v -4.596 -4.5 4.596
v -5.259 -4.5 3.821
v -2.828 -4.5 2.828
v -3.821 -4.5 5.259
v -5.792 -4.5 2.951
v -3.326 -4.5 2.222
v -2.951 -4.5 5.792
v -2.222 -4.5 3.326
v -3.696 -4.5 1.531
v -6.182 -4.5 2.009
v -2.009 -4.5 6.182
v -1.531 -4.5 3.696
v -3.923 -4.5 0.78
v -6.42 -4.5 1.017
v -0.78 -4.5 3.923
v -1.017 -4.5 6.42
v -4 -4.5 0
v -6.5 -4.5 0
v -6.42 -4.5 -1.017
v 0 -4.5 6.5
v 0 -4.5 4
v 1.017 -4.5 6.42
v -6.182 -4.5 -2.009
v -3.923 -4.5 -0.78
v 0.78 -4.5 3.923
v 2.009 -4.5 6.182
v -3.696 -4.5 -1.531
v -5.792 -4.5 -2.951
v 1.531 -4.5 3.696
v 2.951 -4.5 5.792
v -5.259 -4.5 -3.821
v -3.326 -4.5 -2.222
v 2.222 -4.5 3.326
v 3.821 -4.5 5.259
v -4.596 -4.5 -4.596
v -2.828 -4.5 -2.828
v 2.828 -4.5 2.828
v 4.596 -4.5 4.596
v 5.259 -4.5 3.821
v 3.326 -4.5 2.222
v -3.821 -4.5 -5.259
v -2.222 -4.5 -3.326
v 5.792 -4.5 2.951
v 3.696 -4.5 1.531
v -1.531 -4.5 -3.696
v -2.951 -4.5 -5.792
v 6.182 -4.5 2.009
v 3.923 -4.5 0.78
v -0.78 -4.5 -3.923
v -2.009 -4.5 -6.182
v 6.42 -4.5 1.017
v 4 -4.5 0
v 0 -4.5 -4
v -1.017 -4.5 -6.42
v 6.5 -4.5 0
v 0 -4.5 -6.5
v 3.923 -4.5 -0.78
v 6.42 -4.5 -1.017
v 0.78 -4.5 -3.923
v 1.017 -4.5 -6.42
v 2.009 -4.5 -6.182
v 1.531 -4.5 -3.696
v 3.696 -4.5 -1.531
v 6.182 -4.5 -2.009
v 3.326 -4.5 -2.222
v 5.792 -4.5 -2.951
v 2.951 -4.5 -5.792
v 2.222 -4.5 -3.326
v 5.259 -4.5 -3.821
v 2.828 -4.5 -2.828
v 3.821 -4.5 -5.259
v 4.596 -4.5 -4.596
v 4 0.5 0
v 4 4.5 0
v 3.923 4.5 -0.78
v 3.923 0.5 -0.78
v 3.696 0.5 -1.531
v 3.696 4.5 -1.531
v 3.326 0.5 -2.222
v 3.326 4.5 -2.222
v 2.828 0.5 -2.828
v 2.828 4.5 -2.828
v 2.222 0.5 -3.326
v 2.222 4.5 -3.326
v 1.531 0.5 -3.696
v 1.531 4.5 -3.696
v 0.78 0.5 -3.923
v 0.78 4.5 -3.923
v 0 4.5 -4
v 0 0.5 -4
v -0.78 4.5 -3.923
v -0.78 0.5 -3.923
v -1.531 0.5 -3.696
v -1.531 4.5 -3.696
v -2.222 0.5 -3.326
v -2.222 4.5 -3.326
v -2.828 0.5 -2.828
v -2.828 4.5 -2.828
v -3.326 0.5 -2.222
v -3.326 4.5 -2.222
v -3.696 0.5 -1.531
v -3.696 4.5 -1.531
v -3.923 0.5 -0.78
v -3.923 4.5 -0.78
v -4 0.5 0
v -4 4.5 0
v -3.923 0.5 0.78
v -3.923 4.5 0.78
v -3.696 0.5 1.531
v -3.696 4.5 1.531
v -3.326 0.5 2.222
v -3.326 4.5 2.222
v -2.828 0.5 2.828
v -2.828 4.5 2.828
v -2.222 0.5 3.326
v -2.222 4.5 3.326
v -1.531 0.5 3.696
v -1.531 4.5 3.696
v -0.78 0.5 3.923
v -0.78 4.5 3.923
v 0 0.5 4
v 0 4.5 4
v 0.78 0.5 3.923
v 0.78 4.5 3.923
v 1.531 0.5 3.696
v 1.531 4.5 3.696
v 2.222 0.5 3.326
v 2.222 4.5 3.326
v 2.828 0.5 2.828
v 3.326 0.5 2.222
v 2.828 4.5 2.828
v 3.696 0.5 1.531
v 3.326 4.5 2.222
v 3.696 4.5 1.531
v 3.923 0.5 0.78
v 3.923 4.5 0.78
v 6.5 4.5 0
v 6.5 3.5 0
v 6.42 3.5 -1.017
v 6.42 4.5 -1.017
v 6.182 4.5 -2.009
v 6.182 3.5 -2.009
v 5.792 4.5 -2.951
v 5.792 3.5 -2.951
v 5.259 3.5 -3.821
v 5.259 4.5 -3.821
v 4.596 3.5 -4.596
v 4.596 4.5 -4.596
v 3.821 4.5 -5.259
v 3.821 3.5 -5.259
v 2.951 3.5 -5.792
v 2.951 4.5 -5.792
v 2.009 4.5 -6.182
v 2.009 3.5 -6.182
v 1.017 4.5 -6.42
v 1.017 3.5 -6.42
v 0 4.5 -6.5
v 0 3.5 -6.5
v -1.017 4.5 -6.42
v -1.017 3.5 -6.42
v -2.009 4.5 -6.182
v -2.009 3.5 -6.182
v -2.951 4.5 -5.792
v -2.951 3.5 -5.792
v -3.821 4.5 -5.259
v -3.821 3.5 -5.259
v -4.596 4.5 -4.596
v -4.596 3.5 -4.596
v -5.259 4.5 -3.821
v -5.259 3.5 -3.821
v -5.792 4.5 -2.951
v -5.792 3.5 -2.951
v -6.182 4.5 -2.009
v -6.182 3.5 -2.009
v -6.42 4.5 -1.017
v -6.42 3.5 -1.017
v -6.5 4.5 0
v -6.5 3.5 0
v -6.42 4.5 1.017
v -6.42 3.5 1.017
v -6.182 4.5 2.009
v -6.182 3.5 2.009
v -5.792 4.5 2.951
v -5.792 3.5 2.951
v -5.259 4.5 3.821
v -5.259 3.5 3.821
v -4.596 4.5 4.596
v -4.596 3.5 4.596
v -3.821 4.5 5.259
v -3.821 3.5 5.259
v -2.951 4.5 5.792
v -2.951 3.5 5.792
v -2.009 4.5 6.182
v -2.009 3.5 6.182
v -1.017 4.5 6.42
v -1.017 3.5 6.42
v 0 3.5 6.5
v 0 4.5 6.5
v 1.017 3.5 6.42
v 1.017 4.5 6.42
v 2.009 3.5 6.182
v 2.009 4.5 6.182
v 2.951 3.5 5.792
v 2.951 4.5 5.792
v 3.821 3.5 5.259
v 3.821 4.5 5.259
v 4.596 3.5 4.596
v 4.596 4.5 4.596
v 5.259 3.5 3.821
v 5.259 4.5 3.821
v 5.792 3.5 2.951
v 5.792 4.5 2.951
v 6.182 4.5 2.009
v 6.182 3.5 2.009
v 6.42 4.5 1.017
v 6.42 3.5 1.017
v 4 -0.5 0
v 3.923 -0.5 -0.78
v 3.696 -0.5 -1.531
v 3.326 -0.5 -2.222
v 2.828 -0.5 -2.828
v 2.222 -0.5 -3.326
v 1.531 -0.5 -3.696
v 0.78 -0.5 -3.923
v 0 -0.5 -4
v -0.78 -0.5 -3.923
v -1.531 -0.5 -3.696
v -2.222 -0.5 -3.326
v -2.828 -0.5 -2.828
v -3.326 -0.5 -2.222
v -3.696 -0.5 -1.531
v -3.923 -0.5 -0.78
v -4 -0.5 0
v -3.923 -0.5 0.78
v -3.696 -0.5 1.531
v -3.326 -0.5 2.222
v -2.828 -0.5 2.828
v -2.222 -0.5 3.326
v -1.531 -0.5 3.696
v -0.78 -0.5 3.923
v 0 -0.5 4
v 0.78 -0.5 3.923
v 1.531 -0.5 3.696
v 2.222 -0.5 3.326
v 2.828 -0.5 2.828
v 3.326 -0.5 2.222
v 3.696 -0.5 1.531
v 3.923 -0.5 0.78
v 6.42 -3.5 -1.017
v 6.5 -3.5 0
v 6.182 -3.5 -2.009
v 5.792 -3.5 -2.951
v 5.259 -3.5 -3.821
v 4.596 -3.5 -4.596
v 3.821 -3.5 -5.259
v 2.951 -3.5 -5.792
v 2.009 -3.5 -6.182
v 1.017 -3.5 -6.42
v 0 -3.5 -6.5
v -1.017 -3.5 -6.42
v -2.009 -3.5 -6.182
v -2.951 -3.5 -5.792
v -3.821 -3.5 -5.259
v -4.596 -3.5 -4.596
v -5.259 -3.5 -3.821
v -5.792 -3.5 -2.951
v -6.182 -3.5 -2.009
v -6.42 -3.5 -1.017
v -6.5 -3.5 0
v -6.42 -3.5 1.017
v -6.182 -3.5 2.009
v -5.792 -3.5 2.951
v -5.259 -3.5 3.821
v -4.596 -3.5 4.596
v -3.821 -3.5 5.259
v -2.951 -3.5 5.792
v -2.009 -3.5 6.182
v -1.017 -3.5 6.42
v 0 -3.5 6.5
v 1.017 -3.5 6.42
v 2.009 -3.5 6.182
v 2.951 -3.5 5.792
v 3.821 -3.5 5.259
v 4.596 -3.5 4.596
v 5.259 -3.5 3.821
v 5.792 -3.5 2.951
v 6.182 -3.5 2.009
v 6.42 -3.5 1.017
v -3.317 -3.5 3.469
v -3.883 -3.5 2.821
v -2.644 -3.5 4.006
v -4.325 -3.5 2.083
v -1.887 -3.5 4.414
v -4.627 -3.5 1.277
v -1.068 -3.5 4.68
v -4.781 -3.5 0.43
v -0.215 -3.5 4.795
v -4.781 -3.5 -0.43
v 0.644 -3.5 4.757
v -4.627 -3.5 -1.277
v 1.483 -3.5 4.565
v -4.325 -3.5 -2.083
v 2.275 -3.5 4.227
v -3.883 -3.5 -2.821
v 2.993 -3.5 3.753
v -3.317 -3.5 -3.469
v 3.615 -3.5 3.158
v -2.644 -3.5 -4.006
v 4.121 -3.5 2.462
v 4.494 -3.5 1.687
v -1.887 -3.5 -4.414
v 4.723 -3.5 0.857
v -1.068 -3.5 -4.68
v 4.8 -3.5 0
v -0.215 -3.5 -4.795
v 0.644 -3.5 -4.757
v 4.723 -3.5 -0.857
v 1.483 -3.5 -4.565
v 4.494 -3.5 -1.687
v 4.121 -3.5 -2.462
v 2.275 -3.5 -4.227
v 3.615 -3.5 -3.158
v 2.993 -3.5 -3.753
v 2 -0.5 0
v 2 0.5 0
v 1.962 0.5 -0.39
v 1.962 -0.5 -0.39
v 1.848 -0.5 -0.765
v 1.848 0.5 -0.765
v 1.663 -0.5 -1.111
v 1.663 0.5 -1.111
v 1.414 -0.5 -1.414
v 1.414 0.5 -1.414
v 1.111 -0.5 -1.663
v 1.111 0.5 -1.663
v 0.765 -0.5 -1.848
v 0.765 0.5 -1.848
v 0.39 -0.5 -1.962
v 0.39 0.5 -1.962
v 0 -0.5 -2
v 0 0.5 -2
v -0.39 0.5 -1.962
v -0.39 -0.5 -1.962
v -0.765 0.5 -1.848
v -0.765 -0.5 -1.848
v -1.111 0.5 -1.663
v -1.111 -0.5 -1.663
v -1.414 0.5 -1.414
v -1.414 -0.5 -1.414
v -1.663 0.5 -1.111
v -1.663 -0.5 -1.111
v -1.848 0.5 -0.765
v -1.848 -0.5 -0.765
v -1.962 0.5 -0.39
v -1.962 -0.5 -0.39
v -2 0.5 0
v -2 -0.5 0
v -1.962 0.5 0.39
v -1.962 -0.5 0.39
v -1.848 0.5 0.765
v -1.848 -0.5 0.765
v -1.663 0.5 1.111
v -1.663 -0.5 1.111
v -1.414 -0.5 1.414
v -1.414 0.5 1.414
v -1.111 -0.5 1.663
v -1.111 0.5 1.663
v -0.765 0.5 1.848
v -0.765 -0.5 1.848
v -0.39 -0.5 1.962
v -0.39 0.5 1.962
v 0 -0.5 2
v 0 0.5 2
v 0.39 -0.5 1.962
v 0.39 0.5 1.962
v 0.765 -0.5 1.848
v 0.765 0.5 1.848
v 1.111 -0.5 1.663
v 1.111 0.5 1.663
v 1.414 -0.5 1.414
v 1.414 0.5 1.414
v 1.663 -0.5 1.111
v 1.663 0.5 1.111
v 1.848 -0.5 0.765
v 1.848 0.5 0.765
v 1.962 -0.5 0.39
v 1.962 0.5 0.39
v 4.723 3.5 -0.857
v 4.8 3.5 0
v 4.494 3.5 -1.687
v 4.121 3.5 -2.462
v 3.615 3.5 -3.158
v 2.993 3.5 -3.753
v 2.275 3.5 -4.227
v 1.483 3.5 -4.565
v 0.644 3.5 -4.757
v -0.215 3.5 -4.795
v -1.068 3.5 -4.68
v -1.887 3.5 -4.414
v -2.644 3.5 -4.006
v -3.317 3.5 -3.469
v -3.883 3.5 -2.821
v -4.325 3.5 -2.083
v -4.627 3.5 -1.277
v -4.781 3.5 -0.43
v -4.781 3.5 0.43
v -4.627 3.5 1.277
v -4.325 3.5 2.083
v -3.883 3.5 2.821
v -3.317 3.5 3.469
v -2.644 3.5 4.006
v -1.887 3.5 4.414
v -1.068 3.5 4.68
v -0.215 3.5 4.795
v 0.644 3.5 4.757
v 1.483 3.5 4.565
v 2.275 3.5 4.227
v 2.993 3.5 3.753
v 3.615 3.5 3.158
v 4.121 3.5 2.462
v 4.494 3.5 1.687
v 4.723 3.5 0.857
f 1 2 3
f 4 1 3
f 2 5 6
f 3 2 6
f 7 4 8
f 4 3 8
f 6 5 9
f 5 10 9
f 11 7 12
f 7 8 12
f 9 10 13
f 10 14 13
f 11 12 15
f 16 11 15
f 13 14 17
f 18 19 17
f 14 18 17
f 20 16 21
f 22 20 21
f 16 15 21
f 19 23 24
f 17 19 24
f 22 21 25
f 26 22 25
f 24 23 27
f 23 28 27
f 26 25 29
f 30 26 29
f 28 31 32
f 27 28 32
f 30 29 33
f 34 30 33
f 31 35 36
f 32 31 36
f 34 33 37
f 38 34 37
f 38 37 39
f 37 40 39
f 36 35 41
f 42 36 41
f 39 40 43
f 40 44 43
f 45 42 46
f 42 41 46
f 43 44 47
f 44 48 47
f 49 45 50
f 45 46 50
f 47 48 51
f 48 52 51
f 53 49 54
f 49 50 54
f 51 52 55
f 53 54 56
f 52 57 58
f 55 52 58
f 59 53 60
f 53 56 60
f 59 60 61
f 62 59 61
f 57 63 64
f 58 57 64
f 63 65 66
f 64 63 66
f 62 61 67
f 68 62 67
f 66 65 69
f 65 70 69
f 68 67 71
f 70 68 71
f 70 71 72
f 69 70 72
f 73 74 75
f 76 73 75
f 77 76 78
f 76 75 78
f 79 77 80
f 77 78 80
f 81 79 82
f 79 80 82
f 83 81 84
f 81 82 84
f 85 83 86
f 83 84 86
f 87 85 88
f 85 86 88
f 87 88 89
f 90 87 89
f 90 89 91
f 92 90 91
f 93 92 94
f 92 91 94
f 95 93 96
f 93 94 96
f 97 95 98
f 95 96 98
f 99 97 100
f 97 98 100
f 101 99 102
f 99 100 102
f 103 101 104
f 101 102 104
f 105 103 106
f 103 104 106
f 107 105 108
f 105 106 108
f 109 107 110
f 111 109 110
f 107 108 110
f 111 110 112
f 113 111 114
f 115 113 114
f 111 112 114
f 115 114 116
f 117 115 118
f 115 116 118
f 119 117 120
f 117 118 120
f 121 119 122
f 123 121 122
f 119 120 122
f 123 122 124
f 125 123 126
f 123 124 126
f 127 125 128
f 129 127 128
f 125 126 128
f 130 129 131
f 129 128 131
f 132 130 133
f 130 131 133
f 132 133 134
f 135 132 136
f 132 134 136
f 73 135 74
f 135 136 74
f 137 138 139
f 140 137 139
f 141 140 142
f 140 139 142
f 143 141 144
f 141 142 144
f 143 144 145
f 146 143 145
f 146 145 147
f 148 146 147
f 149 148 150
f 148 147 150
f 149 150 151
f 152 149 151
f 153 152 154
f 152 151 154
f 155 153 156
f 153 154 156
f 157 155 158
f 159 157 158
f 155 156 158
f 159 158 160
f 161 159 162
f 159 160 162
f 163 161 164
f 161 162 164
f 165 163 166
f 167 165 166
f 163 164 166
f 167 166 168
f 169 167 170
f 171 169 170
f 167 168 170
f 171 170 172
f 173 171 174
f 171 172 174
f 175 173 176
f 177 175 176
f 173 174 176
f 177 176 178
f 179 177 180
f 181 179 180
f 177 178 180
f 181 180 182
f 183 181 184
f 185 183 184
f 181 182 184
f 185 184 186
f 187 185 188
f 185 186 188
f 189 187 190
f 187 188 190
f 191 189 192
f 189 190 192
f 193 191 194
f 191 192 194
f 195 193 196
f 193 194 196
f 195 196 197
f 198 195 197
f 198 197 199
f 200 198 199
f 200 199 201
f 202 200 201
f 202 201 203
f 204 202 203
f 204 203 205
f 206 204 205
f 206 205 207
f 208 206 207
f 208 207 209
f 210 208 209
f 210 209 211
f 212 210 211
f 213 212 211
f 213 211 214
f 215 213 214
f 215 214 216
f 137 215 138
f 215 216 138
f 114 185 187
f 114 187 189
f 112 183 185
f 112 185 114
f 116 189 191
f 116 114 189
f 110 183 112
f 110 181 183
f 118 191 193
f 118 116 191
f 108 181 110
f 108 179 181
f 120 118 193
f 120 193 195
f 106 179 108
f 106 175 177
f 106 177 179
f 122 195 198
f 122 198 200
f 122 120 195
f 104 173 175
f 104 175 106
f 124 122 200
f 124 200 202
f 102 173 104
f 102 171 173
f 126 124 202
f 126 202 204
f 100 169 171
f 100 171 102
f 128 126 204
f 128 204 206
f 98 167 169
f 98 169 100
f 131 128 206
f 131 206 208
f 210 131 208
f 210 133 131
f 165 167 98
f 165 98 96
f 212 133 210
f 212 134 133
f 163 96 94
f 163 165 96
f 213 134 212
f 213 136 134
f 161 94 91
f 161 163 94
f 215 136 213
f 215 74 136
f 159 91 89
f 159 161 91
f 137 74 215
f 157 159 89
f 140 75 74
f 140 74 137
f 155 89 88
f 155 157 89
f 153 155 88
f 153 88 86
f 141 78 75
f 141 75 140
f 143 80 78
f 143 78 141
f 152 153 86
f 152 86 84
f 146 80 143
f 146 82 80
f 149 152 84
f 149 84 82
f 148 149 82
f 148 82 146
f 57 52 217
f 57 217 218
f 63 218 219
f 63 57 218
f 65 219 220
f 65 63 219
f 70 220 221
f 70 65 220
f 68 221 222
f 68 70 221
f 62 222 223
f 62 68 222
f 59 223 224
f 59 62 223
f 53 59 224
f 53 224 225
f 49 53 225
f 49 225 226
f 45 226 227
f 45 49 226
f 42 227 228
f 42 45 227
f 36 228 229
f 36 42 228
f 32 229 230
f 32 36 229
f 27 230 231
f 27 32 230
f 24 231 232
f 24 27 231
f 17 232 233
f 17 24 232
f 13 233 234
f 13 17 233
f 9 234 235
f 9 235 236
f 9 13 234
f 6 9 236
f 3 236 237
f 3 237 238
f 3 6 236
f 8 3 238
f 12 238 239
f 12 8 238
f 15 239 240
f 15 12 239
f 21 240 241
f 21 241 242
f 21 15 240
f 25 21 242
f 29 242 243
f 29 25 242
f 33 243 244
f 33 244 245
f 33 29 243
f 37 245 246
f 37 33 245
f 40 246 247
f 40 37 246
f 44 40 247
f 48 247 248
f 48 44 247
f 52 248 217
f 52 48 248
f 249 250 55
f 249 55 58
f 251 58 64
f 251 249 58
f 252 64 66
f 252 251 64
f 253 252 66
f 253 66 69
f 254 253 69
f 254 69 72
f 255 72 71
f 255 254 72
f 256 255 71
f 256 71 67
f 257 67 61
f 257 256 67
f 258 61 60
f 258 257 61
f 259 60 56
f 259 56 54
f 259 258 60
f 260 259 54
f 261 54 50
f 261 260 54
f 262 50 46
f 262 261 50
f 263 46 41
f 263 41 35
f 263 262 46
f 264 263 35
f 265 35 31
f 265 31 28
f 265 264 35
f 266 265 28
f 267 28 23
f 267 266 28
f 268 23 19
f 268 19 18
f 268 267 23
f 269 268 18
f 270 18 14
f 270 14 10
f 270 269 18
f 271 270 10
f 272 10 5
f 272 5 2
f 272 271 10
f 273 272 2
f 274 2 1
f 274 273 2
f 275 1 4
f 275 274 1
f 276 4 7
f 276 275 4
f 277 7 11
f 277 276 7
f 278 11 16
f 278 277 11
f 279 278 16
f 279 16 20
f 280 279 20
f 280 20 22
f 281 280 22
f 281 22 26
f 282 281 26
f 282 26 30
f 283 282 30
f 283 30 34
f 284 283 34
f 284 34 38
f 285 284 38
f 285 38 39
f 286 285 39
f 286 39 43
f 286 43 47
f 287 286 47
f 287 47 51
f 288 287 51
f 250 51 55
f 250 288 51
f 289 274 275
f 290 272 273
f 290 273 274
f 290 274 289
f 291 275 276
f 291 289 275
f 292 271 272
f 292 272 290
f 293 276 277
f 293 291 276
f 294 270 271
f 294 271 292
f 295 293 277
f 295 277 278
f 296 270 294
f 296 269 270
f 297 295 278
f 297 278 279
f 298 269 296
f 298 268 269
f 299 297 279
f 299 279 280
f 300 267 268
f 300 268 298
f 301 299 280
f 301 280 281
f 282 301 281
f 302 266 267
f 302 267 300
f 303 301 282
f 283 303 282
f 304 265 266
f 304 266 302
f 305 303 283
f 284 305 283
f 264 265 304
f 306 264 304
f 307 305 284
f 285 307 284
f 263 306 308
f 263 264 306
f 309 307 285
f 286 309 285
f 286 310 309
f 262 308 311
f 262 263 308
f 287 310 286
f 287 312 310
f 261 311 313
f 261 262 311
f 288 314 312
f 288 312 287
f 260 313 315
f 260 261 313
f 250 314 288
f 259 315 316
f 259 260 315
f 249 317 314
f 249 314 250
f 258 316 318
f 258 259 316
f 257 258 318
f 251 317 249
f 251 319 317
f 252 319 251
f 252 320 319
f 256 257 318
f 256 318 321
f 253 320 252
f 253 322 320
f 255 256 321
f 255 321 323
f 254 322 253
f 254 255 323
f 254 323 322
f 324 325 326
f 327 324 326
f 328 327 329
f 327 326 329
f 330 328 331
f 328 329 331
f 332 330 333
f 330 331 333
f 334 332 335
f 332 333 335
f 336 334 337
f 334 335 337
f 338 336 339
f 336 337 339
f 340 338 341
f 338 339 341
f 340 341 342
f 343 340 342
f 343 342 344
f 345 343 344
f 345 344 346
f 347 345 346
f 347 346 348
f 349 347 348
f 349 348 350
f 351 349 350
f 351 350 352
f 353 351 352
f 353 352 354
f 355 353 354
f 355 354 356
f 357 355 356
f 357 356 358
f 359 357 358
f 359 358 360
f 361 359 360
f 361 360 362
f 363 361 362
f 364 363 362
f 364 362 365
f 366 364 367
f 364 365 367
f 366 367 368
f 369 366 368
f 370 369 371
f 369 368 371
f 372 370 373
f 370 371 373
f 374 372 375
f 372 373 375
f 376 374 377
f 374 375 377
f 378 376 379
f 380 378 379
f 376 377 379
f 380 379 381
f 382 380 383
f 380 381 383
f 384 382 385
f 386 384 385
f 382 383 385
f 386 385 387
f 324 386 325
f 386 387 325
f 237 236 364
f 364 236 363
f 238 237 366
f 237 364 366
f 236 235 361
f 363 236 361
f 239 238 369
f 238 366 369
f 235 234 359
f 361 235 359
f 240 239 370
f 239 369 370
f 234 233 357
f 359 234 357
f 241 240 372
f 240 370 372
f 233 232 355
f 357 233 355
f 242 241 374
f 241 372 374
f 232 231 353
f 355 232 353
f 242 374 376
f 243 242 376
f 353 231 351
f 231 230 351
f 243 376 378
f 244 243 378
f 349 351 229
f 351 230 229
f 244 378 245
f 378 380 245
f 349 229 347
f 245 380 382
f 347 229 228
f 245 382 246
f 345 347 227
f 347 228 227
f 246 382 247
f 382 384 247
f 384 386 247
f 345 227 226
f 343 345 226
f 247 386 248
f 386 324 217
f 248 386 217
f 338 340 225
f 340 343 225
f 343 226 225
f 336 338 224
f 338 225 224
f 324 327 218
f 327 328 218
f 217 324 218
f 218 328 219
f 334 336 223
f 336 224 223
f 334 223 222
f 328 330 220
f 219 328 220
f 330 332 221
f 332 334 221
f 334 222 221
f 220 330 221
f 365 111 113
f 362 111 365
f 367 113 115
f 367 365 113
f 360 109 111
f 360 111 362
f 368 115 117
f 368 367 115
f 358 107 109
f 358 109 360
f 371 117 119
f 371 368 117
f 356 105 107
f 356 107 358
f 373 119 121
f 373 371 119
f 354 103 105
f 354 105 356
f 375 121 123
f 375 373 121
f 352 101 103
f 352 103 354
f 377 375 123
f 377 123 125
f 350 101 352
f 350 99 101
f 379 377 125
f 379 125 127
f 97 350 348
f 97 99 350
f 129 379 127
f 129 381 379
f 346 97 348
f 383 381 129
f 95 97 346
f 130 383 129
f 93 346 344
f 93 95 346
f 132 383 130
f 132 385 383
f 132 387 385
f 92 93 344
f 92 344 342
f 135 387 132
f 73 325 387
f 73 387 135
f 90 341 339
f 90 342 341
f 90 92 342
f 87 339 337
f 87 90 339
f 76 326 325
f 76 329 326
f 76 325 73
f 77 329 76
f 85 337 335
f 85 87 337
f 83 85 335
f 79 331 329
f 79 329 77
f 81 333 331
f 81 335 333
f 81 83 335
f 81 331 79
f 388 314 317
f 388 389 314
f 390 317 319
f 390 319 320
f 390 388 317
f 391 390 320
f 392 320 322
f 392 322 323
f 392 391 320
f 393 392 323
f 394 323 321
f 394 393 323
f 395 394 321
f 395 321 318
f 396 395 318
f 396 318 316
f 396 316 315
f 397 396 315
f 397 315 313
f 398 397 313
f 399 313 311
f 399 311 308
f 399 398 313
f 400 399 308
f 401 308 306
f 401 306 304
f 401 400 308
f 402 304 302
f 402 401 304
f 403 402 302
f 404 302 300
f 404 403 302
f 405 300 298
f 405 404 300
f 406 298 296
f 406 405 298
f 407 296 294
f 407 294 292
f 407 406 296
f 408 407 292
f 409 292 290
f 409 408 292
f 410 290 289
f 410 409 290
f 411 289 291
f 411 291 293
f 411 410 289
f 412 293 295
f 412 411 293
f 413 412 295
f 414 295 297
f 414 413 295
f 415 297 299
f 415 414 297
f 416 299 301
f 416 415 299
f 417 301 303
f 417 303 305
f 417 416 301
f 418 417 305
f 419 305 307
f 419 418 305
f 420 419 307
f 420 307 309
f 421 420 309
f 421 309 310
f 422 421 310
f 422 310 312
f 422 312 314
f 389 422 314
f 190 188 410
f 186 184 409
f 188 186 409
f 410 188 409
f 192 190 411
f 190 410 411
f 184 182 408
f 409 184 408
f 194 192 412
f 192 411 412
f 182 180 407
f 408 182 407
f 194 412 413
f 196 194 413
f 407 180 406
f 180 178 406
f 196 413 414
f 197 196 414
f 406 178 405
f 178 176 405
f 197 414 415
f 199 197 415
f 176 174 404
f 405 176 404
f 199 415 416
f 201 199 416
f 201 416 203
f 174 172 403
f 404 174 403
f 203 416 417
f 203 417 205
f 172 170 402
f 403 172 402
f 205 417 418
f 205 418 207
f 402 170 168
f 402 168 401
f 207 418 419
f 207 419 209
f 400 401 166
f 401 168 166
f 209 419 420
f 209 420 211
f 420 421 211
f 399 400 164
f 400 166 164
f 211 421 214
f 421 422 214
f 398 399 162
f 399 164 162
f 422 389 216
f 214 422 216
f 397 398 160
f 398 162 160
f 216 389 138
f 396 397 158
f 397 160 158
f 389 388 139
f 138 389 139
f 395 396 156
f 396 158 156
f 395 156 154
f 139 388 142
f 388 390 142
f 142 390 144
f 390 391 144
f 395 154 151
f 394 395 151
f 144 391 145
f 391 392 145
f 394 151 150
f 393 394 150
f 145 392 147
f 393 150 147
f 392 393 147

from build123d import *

# Parameters (mm, degrees)
SKETCH2_R           = 4.8
BOSS_EXTRUDE1_DEPTH = 3.5
SKETCH3_R           = 6.5
BOSS_EXTRUDE2_DEPTH = 1
SKETCH4_R           = 4
CUT_EXTRUDE1_DEPTH  = 4
SKETCH5_R           = 2
CUT_EXTRUDE2_DEPTH  = 6


with BuildPart() as part:
    # Sketch2 → Boss-Extrude1 (new body, symmetric)
    with BuildSketch(Plane(origin=(0, 0, 0), x_dir=(1, 0, 0), z_dir=(0, 1, 0))):
        Circle(SKETCH2_R)
    extrude(amount=BOSS_EXTRUDE1_DEPTH, both=True)

    # Sketch3 → Boss-Extrude2 (add)
    with BuildSketch(Plane(origin=(0, 3.5, 0), x_dir=(1, 0, 0), z_dir=(0, 1, 0))):
        Circle(SKETCH3_R)
    boss_extrude2 = extrude(amount=BOSS_EXTRUDE2_DEPTH)

    # Sketch4 → Cut-Extrude1 (cut)
    with BuildSketch(Plane(origin=(0, 4.5, 0), x_dir=(1, 0, 0), z_dir=(0, 1, 0))):
        Circle(SKETCH4_R)
    cut_extrude1 = extrude(amount=-CUT_EXTRUDE1_DEPTH, mode=Mode.SUBTRACT)

    # Mirror1: Boss-Extrude2, Cut-Extrude1 across plane
    add(boss_extrude2.mirror(Plane.ZX))
    add(cut_extrude1.mirror(Plane.ZX), mode=Mode.SUBTRACT)

    # Sketch5 → Cut-Extrude2 (cut, through all)
    with BuildSketch(Plane(origin=(0, 0.5, 0), x_dir=(1, 0, 0), z_dir=(0, 1, 0))):
        Circle(SKETCH5_R)
    extrude(amount=-CUT_EXTRUDE2_DEPTH, mode=Mode.SUBTRACT)


solid = part.part
